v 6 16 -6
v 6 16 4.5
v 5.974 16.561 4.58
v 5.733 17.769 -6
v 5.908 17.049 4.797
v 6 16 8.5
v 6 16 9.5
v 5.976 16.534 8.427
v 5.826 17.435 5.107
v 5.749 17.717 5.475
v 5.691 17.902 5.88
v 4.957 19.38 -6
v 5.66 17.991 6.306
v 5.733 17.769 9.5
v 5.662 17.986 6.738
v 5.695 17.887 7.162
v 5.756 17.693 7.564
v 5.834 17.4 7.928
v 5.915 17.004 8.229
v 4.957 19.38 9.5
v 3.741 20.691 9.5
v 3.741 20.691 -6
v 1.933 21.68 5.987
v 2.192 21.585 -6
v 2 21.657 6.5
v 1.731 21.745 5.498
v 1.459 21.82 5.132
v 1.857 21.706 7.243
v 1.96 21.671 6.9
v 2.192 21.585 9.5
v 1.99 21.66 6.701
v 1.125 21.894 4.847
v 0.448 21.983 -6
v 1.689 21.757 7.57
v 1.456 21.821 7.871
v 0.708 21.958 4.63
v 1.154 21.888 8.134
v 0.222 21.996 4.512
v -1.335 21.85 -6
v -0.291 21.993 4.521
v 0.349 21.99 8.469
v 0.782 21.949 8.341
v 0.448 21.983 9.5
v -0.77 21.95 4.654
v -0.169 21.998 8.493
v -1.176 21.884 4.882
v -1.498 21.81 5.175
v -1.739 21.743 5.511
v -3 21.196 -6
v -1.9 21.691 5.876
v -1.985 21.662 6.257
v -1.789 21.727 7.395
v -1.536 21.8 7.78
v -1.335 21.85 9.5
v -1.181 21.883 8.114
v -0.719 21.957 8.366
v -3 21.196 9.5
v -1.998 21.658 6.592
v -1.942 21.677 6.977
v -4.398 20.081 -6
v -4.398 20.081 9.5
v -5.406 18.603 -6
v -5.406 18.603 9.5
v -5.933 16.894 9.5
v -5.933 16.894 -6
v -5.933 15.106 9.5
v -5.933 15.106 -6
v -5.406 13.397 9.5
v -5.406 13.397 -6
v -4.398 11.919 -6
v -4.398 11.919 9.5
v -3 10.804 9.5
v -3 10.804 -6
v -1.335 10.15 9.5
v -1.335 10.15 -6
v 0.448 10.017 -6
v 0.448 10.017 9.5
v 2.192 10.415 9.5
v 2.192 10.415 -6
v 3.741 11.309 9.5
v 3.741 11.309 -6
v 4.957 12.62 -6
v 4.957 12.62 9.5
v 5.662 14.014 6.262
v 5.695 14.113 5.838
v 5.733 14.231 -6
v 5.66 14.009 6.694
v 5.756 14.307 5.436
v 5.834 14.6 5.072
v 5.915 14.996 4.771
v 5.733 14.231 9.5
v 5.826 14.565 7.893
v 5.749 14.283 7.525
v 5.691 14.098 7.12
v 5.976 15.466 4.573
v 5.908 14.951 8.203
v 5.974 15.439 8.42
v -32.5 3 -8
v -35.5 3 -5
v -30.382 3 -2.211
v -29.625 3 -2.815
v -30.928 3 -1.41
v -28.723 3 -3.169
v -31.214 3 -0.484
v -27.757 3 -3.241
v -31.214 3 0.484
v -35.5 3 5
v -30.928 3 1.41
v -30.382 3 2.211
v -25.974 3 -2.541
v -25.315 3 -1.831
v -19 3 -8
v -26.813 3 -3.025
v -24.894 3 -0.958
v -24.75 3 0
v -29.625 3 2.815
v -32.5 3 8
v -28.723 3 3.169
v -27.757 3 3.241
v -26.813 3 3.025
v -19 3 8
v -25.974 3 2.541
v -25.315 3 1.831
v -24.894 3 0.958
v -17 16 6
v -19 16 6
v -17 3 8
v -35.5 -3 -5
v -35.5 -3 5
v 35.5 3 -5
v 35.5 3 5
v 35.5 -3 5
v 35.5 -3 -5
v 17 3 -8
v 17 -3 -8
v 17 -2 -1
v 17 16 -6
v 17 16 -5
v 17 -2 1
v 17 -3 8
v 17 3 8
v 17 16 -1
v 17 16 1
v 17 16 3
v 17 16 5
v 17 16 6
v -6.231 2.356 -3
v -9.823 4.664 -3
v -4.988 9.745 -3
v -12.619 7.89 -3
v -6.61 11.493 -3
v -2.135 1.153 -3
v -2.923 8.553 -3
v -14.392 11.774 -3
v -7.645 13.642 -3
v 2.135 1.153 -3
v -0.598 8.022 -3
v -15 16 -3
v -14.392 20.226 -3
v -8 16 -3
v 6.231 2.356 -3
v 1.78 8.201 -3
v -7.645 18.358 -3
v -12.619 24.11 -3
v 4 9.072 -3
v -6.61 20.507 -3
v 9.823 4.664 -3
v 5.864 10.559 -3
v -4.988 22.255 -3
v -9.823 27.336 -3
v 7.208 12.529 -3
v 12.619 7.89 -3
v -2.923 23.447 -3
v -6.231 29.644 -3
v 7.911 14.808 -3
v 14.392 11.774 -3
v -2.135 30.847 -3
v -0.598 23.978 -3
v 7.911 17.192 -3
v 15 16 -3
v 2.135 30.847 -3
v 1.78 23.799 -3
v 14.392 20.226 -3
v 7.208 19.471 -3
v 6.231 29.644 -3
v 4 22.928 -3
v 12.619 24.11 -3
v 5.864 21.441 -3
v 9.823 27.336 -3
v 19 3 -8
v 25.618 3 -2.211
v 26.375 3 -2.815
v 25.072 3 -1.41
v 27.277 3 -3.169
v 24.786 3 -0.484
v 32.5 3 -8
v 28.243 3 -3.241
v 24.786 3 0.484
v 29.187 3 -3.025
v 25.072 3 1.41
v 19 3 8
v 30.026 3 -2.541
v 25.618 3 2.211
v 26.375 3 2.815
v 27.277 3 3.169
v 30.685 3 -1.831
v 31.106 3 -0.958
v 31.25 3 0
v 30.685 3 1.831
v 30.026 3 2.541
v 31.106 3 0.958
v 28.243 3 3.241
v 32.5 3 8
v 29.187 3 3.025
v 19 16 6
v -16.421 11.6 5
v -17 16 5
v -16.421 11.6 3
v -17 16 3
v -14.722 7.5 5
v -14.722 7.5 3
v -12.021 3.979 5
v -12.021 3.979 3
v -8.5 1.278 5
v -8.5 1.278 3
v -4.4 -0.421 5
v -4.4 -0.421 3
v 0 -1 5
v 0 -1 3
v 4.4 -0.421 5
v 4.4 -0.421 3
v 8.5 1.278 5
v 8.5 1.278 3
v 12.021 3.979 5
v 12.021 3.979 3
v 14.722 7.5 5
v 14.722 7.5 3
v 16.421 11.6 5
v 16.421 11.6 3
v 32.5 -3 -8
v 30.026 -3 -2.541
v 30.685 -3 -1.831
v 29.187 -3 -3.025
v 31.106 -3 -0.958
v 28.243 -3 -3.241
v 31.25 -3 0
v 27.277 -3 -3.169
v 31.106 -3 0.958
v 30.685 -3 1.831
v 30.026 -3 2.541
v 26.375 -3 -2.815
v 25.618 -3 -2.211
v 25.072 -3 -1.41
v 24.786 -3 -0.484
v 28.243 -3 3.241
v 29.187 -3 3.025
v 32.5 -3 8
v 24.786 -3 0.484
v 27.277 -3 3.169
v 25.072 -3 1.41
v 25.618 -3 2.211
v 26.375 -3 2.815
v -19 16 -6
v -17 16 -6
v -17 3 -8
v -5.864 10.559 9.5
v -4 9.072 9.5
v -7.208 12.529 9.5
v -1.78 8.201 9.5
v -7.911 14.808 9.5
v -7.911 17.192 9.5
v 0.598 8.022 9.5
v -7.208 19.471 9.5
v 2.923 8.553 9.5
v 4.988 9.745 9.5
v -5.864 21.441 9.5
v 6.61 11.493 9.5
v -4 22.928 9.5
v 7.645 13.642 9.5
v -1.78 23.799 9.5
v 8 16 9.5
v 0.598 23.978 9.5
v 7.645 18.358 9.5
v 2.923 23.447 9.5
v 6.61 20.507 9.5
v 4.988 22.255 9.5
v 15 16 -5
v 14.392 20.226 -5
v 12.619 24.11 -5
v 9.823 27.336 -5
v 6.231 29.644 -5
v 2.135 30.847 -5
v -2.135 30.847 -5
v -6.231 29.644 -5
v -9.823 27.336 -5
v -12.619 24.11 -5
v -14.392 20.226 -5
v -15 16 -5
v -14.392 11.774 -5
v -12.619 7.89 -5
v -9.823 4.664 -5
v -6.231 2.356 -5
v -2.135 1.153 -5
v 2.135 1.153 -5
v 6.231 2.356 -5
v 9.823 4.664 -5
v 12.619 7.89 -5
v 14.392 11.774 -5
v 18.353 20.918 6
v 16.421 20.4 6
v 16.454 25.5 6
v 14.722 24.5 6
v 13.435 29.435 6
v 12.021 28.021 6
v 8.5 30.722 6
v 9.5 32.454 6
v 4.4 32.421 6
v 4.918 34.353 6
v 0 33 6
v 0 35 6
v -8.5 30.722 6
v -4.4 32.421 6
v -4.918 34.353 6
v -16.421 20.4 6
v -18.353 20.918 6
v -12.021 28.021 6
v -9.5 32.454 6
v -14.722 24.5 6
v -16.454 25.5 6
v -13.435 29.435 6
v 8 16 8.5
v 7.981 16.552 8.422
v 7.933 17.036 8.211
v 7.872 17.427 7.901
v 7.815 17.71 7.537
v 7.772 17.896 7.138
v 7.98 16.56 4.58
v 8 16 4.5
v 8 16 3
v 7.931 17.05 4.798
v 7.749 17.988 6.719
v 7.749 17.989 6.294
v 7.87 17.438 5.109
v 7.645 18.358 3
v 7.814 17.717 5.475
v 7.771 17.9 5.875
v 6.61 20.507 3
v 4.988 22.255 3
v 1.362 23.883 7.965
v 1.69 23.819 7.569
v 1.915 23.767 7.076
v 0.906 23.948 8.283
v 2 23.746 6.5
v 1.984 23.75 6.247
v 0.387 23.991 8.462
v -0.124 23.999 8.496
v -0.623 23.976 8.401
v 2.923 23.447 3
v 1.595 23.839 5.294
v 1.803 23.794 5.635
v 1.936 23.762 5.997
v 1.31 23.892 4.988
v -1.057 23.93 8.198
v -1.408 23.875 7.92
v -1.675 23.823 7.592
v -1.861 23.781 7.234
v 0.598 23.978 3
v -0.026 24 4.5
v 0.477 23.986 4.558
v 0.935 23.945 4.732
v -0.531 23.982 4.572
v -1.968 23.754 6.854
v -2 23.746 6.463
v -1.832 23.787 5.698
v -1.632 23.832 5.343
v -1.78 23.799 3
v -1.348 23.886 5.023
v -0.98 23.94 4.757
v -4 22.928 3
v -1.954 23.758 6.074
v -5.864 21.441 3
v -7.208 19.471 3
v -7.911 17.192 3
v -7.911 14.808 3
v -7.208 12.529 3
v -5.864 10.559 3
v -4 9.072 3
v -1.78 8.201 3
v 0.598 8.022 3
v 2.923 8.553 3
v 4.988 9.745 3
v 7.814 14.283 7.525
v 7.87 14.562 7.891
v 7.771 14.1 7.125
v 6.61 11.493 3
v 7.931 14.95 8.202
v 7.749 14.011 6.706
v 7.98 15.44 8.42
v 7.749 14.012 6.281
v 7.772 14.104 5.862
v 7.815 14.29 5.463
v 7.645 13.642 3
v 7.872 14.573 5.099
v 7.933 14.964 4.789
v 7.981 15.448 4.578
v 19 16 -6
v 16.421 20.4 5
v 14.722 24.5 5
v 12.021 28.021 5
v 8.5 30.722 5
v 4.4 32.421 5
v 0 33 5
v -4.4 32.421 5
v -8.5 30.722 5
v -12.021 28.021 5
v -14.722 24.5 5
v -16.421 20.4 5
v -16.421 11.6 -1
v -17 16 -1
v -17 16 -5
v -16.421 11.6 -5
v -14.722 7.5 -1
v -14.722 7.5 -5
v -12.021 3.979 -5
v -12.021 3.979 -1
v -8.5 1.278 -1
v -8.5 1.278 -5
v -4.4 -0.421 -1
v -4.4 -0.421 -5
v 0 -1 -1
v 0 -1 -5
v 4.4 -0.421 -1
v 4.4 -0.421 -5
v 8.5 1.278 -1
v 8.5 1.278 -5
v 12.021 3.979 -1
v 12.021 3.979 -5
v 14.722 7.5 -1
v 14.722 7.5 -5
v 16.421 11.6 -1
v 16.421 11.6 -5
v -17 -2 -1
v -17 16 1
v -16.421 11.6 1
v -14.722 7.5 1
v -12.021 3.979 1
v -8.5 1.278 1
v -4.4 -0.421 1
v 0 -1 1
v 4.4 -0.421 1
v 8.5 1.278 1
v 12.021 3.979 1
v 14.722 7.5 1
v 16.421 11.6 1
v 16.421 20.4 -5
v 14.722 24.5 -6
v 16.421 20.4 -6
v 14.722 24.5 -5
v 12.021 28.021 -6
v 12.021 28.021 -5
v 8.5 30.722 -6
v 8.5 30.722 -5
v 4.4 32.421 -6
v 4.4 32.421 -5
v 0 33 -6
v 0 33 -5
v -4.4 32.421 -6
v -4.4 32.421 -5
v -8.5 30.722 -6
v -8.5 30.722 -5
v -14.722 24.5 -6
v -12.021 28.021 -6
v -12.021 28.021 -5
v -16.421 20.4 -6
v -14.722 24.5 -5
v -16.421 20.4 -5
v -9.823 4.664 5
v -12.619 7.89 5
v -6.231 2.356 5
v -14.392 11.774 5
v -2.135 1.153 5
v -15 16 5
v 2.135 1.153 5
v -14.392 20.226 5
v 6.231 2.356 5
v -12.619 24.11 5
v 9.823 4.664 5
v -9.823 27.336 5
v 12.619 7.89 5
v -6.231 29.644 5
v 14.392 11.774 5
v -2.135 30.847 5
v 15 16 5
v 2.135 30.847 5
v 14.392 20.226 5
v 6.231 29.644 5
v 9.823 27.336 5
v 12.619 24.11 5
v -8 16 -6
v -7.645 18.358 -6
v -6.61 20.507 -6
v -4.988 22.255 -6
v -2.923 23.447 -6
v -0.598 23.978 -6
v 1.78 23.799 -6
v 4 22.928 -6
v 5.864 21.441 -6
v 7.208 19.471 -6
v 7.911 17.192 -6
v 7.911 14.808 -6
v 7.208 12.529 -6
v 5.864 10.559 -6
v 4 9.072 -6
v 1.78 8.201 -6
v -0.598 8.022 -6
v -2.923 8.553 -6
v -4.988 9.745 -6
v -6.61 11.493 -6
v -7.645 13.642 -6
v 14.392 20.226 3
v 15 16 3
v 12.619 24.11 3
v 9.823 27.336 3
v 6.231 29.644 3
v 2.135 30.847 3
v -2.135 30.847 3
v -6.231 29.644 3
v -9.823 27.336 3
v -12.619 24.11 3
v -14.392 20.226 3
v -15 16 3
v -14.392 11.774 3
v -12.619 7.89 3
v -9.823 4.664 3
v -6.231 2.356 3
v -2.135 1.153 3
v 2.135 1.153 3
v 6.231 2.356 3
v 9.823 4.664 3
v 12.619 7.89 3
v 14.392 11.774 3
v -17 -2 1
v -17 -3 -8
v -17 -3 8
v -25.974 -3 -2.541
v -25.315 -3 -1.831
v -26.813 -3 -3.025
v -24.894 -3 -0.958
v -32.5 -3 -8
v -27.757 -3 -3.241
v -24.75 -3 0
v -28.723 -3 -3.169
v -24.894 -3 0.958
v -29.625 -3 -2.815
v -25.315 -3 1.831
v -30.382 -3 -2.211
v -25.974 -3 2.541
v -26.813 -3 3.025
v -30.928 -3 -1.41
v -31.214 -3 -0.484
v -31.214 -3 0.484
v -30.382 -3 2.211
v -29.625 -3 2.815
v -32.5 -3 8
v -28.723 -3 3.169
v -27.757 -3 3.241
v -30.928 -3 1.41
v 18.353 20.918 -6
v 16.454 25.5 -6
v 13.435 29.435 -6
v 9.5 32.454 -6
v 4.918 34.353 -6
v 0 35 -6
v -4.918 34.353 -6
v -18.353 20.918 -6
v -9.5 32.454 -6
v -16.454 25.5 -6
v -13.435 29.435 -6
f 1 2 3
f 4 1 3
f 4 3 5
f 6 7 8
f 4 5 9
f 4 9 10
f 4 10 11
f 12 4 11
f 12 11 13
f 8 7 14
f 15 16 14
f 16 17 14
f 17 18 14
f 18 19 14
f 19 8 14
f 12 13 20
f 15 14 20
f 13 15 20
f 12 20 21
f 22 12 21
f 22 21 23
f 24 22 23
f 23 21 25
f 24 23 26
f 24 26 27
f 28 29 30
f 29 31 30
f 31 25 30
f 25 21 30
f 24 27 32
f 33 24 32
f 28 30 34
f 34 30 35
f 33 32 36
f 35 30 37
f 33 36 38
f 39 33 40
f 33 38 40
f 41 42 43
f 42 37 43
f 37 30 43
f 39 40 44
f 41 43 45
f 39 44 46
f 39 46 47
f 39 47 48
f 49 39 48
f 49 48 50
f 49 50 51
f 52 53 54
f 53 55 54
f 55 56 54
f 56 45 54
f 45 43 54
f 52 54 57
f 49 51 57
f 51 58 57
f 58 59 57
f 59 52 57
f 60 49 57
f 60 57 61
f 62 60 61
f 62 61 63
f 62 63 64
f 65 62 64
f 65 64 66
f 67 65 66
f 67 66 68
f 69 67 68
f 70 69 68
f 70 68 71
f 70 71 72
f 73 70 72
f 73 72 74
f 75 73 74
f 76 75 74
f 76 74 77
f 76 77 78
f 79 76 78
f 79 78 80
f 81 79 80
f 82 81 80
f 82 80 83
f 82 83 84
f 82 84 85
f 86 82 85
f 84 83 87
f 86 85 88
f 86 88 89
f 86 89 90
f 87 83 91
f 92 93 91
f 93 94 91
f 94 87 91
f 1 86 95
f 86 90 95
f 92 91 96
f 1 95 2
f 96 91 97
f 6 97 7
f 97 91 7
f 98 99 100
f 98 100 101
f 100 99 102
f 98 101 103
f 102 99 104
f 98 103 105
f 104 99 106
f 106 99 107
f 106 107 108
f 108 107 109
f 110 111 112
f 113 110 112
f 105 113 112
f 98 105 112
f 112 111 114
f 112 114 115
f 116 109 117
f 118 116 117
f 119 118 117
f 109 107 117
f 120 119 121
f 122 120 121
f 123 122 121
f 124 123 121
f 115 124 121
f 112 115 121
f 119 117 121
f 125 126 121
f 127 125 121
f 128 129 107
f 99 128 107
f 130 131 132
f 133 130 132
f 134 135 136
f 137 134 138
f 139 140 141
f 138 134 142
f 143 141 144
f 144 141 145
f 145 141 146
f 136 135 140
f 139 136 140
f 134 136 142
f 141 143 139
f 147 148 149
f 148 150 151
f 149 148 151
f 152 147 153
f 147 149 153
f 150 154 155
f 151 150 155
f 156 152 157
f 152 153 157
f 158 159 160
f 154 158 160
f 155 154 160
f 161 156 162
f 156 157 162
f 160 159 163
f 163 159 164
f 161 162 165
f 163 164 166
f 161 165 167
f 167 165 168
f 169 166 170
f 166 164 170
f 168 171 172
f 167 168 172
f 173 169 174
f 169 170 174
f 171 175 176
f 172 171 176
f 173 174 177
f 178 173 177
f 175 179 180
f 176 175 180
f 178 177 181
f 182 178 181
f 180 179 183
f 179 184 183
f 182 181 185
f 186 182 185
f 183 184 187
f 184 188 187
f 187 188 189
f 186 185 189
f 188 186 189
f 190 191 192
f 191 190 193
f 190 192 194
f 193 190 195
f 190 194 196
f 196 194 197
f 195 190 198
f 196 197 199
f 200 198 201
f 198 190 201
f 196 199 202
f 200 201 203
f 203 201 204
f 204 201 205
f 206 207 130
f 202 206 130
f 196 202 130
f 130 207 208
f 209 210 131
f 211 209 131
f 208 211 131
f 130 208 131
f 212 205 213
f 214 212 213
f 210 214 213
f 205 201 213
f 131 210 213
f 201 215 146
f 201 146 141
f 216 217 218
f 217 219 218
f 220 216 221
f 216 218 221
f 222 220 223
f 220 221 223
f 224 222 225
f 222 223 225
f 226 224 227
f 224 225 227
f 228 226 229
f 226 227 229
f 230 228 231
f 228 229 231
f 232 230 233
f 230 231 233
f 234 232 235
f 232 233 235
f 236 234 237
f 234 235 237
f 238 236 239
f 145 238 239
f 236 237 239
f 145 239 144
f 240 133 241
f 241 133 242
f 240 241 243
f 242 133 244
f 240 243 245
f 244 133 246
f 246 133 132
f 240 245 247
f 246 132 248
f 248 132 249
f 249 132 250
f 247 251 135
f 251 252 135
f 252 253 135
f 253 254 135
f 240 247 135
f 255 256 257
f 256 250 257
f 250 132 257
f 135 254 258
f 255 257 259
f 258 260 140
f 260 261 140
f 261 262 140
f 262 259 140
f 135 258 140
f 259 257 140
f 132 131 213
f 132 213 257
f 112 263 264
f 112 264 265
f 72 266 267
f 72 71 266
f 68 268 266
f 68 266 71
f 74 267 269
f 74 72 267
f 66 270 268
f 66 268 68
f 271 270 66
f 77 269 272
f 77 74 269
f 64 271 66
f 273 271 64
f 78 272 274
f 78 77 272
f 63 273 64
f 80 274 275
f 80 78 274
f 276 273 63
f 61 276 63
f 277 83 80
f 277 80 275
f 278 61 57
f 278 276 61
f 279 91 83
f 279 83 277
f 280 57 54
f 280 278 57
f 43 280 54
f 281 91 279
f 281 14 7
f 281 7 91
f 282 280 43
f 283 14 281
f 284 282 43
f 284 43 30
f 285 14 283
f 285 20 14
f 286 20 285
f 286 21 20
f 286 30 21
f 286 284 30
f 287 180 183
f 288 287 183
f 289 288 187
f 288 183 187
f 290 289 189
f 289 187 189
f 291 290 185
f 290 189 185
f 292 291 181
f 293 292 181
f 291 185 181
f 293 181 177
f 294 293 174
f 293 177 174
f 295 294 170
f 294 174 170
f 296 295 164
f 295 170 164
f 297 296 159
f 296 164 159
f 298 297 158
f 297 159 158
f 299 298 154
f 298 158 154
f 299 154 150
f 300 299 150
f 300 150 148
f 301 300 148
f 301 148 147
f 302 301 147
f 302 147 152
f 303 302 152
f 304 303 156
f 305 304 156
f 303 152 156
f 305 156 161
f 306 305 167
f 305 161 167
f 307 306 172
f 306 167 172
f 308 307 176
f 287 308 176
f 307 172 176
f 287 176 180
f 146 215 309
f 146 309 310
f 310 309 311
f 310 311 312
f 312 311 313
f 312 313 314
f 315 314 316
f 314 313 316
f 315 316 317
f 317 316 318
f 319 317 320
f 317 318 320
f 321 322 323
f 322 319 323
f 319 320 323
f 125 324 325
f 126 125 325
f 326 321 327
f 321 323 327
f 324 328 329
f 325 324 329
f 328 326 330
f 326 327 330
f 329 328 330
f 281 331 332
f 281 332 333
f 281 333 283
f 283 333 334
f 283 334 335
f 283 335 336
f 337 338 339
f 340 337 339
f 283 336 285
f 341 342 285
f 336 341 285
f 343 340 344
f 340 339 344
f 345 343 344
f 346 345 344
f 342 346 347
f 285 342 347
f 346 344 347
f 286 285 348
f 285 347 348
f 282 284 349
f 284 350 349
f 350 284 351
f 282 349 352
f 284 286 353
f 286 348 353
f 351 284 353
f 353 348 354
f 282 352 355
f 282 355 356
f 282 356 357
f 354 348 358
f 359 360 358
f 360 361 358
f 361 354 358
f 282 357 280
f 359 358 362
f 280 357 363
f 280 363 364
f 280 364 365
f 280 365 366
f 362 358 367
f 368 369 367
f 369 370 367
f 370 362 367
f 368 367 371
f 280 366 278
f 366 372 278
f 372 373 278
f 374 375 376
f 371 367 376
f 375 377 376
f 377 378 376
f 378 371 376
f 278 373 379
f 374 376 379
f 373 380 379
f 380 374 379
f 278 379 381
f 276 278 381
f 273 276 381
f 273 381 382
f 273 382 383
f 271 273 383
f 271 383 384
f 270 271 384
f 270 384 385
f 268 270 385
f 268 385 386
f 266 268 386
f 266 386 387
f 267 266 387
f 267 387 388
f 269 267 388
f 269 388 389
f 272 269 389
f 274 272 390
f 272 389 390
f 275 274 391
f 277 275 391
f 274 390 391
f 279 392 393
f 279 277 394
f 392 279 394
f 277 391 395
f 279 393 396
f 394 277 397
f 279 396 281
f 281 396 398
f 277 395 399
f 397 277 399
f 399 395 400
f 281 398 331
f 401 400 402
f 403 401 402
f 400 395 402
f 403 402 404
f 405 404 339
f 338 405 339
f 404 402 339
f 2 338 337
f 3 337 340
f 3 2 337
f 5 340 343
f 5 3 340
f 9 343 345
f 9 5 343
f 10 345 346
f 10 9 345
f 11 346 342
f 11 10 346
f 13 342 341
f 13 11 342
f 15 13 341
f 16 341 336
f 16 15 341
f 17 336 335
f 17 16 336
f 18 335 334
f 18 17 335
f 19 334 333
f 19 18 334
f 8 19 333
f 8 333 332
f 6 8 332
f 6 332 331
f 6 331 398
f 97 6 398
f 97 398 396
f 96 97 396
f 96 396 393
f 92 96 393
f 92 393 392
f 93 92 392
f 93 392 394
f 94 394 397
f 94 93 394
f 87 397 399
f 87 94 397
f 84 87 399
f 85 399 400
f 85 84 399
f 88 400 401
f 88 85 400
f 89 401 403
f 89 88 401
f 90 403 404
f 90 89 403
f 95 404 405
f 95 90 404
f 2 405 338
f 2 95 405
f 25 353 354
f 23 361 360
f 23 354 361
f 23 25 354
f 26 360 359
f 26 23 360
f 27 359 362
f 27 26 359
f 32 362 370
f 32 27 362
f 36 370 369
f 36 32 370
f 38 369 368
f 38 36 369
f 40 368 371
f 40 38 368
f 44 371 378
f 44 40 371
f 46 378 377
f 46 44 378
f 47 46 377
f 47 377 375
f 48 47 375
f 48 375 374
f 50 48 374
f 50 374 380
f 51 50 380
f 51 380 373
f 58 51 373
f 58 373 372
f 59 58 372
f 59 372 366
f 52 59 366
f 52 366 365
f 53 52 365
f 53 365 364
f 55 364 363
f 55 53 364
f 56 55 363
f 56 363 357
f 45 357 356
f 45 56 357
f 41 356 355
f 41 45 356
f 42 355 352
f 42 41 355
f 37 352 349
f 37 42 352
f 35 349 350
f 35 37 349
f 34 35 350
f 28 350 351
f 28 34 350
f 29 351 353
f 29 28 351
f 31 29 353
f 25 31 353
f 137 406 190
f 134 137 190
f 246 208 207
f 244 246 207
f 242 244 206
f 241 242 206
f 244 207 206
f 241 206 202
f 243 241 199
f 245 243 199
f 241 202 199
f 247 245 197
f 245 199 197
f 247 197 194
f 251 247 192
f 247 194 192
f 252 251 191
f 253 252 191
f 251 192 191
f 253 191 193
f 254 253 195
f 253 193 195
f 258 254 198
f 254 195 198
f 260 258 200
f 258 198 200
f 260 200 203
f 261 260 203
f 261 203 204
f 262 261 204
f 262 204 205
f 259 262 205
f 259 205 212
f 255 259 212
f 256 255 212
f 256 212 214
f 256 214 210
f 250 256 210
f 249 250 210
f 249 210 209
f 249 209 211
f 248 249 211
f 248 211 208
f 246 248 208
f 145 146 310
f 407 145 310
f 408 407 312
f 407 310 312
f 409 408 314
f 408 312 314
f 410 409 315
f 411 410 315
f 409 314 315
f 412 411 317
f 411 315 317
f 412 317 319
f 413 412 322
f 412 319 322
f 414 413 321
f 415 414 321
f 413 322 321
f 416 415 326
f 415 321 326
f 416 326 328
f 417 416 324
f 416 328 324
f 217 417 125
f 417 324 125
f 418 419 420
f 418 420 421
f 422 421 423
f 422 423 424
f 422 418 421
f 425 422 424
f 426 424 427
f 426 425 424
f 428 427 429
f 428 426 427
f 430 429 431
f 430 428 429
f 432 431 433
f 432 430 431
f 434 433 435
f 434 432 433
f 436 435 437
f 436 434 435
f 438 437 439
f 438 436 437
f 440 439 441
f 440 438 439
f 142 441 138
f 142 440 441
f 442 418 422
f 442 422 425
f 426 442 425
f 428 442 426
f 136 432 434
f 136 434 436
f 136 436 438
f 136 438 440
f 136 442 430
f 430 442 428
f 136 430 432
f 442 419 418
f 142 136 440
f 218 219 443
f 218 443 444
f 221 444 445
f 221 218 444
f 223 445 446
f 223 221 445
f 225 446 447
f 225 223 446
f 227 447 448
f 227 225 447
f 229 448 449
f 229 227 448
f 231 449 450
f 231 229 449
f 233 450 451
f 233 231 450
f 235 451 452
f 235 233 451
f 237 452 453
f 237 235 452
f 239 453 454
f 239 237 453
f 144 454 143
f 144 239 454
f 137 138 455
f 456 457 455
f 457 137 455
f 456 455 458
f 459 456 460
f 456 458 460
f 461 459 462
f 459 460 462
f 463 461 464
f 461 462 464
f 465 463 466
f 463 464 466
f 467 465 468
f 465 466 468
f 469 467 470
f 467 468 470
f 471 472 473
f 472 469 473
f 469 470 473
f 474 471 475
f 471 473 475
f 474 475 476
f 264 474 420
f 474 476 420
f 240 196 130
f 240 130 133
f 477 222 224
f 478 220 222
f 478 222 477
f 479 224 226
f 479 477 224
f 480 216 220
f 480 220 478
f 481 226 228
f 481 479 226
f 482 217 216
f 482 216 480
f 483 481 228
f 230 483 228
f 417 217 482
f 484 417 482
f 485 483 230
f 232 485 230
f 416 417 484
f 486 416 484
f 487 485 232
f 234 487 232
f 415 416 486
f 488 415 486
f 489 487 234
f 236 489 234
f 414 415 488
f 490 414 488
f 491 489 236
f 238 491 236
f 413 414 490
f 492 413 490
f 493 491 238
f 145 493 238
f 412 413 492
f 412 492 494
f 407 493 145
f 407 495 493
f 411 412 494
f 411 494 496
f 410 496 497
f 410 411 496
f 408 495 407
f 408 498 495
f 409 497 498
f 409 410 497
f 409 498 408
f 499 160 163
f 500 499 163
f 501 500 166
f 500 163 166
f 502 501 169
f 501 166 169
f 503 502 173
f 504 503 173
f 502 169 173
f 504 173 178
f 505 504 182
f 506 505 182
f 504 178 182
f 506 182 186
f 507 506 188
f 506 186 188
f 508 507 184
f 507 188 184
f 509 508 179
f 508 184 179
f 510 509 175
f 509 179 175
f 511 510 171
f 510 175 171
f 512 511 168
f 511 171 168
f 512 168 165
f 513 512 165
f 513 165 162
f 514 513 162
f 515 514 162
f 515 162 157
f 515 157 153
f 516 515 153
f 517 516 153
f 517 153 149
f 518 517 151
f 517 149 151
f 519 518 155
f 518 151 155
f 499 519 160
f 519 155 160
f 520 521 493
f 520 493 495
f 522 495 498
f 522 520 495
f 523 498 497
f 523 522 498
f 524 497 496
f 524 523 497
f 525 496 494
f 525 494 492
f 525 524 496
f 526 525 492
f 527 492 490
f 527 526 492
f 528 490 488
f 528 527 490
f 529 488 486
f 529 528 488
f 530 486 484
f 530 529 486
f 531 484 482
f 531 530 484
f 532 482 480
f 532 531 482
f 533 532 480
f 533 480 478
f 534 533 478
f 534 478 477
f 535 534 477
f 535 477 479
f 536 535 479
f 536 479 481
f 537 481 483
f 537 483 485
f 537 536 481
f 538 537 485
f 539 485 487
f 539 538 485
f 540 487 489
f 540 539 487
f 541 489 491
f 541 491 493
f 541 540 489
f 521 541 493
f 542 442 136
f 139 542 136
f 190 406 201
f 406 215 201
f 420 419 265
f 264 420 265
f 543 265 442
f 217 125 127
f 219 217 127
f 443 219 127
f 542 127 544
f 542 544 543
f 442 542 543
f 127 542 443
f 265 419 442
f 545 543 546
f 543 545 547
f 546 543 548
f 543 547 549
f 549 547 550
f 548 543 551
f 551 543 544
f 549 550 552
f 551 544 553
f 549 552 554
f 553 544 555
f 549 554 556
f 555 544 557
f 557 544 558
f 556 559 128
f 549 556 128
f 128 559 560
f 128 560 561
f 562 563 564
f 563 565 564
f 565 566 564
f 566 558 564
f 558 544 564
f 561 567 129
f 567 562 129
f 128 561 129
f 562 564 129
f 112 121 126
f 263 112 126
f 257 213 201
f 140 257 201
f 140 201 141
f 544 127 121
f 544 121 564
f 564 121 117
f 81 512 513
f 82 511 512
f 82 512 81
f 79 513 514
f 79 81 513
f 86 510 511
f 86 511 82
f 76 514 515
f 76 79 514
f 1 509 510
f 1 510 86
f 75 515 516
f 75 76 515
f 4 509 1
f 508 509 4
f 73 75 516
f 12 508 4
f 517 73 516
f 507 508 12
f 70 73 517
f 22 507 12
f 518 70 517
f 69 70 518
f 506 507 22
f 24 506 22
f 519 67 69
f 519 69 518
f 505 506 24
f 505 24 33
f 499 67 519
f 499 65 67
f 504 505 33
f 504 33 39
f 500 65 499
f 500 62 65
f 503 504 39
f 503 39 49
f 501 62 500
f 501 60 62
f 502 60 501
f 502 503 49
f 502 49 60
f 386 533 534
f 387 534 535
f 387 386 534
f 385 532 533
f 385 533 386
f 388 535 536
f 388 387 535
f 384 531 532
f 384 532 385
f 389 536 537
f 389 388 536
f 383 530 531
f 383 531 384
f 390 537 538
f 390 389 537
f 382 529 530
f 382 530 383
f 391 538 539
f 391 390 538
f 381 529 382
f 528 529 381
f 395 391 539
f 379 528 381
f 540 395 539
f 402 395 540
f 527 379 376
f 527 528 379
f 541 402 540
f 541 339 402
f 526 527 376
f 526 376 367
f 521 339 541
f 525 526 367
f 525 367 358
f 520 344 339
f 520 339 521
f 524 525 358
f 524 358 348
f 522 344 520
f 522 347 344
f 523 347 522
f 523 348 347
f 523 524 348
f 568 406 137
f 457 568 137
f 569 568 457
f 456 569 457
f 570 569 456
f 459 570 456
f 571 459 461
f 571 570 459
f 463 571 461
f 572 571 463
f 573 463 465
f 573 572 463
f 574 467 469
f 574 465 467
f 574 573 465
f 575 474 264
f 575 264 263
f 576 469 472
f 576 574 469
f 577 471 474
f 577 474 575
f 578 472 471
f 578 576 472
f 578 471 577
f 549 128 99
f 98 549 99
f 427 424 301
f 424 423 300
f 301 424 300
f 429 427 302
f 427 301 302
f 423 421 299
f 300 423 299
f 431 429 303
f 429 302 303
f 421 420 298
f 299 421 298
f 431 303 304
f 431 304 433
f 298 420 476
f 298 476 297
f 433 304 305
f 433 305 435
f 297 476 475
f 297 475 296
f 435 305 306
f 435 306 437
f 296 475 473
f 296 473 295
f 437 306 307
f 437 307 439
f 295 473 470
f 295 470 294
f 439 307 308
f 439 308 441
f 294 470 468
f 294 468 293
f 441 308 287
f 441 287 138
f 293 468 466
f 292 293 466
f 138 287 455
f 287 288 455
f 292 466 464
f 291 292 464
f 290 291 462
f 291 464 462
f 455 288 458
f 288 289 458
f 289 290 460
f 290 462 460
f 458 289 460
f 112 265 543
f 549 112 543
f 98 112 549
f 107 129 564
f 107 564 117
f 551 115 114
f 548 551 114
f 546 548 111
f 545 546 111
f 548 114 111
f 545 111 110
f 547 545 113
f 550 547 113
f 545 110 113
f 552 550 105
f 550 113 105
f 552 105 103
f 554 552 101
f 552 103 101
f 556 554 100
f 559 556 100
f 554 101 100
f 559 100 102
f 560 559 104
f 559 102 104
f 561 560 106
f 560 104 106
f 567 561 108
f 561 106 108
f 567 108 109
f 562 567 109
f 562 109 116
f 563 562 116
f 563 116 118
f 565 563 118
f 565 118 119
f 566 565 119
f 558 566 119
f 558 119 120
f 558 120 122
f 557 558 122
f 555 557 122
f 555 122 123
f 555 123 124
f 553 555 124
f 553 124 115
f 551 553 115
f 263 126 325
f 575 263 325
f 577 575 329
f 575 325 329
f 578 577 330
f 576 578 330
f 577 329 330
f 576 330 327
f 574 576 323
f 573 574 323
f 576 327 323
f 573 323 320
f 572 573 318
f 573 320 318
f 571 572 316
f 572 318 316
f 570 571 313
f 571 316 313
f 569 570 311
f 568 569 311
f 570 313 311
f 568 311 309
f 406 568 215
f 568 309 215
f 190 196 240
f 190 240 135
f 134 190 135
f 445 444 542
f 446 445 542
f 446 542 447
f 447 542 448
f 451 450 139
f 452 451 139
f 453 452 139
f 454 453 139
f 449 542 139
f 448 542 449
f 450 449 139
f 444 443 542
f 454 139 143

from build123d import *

# Parameters (mm, degrees)
BOSS_EXTRUDE1_DEPTH = 8
CHAMFER1_SIZE       = 3
SKETCH3_R           = 3.25
CUT_EXTRUDE2_DEPTH  = 19
SKETCH4_R           = 17
BOSS_EXTRUDE2_DEPTH = 3
SKETCH5_R           = 17
SKETCH5_R_2         = 15
BOSS_EXTRUDE3_DEPTH = 2
SKETCH6_R           = 8
BOSS_EXTRUDE4_DEPTH = 6.5
SKETCH7_R           = 8
BOSS_EXTRUDE5_DEPTH = 3
SKETCH8_R           = 6
CUT_EXTRUDE3_DEPTH  = 23
BOSS_EXTRUDE6_REACH = 39
SKETCH9_W           = 34
SKETCH9_H           = 2
CUT_EXTRUDE4_DEPTH  = 2
SKETCH11_W          = 2
SKETCH11_H          = 2
CUT_REVOLVE1_ANGLE  = 180
SKETCH12_R          = 2
CUT_EXTRUDE5_DEPTH  = 12
SKETCH13_R          = 2
CUT_EXTRUDE6_DEPTH  = 4


with BuildPart() as part:
    # Sketch1 → Boss-Extrude1 (new body, symmetric)
    with BuildSketch(Plane.XY):
        with BuildLine():
            Line((-35.5, 3), (-19, 3))
            Line((-19, 3), (-19, 16))
            ThreePointArc((-19, 16), (0, 35), (19, 16))
            Line((19, 16), (19, 3))
            Line((19, 3), (35.5, 3))
            Line((35.5, 3), (35.5, -3))
            Line((35.5, -3), (17, -3))
            Line((17, -3), (17, 16))
            ThreePointArc((17, 16), (0, 33), (-17, 16))
            Line((-17, 16), (-17, -3))
            Line((-17, -3), (-35.5, -3))
            Line((-35.5, -3), (-35.5, 3))
        make_face()
    extrude(amount=BOSS_EXTRUDE1_DEPTH, both=True)

    # Chamfer1
    chamfer1_edges = [part.edges().sort_by_distance(p)[0] for p in [
        (-35.5, 0, -8),
        (35.5, 0, -8),
        (-35.5, 0, 8),
        (35.5, 0, 8),
    ]]
    chamfer(chamfer1_edges, length=CHAMFER1_SIZE)

    # Sketch3 → Cut-Extrude2 (cut)
    with BuildSketch(Plane(origin=(0, 3, 0), x_dir=(1, 0, 0), z_dir=(0, 1, 0))):
        with Locations((28, 0)):
            Circle(SKETCH3_R)
        with Locations((-28, 0)):
            Circle(SKETCH3_R)
    extrude(amount=-CUT_EXTRUDE2_DEPTH, mode=Mode.SUBTRACT)

    # Sketch4 → Boss-Extrude2 (add, symmetric)
    with BuildSketch(Plane.XY):
        with Locations((0, 16)):
            Circle(SKETCH4_R)
    extrude(amount=BOSS_EXTRUDE2_DEPTH, both=True)

    # Sketch5 → Boss-Extrude3 (add)
    with BuildSketch(Plane.XY.offset(3)):
        with Locations((0, 16)):
            Circle(SKETCH5_R)
        with Locations((0, 16)):
            Circle(SKETCH5_R_2, mode=Mode.SUBTRACT)
    boss_extrude3 = extrude(amount=BOSS_EXTRUDE3_DEPTH)

    # Mirror1: Boss-Extrude3 across plane
    add(boss_extrude3.mirror(Plane.XY))

    # Sketch6 → Boss-Extrude4 (add)
    with BuildSketch(Plane.XY.offset(3)):
        with Locations((0, 16)):
            Circle(SKETCH6_R)
    extrude(amount=BOSS_EXTRUDE4_DEPTH)

    # Sketch7 → Boss-Extrude5 (add)
    with BuildSketch(Plane(origin=(0, 0, -3), x_dir=(-1, 0, 0), z_dir=(0, 0, -1))):
        with Locations((0, 16)):
            Circle(SKETCH7_R)
    extrude(amount=BOSS_EXTRUDE5_DEPTH)

    # Sketch8 → Cut-Extrude3 (cut)
    with BuildSketch(Plane.XY.offset(9.5)):
        with Locations((0, 16)):
            Circle(SKETCH8_R)
    extrude(amount=-CUT_EXTRUDE3_DEPTH, mode=Mode.SUBTRACT)

    # Sketch9 → Boss-Extrude6 (add, up to next)
    with BuildSketch(Plane(origin=(0, -2, 0), x_dir=(1, 0, 0), z_dir=(0, 1, 0)), mode=Mode.PRIVATE) as boss_extrude6_sk1:
        Rectangle(SKETCH9_W, SKETCH9_H)
    boss_extrude6_tool1 = extrude(boss_extrude6_sk1.sketch, amount=BOSS_EXTRUDE6_REACH, mode=Mode.PRIVATE) - part.part
    add(boss_extrude6_tool1.solids().sort_by_distance((0, -2, 0))[0])

    # Sketch10 → Cut-Extrude4 (cut)
    with BuildSketch(Plane(origin=(19, 0, 0), x_dir=(0, 0, -1), z_dir=(1, 0, 0))):
        Polygon((-8, 3), (-8, 16), (-6, 16), align=None)
        Polygon((6, 16), (8, 3), (8, 16), align=None)
    cut_extrude4 = extrude(amount=-CUT_EXTRUDE4_DEPTH, mode=Mode.SUBTRACT)

    # Mirror2: Cut-Extrude4 across plane
    add(cut_extrude4.mirror(Plane(origin=(0, 0, 0), x_dir=(0, 0, 1), z_dir=(1, 0, 0))), mode=Mode.SUBTRACT)

    # Sketch11 → Cut-Revolve1 (revolve, cut)
    with BuildSketch(Plane.XZ.offset(-16)):
        with Locations((-18, 7)):
            Rectangle(SKETCH11_W, SKETCH11_H)
        with Locations((-18, -7)):
            Rectangle(SKETCH11_W, SKETCH11_H)
    revolve(axis=Axis((0, 16, 3), (0, 0, -1)), revolution_arc=CUT_REVOLVE1_ANGLE, mode=Mode.SUBTRACT)

    # Sketch12 → Cut-Extrude5 (cut)
    with BuildSketch(Plane(origin=(0, 0, 0), x_dir=(0, 0, -1), z_dir=(1, 0, 0))):
        with Locations((-6.5, 16)):
            Circle(SKETCH12_R)
    extrude(amount=CUT_EXTRUDE5_DEPTH, mode=Mode.SUBTRACT)

    # Sketch13 → Cut-Extrude6 (cut)
    with BuildSketch(Plane(origin=(0, 20, 0), x_dir=(1, 0, 0), z_dir=(0, 1, 0))):
        with Locations((0, -6.5)):
            Circle(SKETCH13_R)
    extrude(amount=CUT_EXTRUDE6_DEPTH, mode=Mode.SUBTRACT)


solid = part.part
